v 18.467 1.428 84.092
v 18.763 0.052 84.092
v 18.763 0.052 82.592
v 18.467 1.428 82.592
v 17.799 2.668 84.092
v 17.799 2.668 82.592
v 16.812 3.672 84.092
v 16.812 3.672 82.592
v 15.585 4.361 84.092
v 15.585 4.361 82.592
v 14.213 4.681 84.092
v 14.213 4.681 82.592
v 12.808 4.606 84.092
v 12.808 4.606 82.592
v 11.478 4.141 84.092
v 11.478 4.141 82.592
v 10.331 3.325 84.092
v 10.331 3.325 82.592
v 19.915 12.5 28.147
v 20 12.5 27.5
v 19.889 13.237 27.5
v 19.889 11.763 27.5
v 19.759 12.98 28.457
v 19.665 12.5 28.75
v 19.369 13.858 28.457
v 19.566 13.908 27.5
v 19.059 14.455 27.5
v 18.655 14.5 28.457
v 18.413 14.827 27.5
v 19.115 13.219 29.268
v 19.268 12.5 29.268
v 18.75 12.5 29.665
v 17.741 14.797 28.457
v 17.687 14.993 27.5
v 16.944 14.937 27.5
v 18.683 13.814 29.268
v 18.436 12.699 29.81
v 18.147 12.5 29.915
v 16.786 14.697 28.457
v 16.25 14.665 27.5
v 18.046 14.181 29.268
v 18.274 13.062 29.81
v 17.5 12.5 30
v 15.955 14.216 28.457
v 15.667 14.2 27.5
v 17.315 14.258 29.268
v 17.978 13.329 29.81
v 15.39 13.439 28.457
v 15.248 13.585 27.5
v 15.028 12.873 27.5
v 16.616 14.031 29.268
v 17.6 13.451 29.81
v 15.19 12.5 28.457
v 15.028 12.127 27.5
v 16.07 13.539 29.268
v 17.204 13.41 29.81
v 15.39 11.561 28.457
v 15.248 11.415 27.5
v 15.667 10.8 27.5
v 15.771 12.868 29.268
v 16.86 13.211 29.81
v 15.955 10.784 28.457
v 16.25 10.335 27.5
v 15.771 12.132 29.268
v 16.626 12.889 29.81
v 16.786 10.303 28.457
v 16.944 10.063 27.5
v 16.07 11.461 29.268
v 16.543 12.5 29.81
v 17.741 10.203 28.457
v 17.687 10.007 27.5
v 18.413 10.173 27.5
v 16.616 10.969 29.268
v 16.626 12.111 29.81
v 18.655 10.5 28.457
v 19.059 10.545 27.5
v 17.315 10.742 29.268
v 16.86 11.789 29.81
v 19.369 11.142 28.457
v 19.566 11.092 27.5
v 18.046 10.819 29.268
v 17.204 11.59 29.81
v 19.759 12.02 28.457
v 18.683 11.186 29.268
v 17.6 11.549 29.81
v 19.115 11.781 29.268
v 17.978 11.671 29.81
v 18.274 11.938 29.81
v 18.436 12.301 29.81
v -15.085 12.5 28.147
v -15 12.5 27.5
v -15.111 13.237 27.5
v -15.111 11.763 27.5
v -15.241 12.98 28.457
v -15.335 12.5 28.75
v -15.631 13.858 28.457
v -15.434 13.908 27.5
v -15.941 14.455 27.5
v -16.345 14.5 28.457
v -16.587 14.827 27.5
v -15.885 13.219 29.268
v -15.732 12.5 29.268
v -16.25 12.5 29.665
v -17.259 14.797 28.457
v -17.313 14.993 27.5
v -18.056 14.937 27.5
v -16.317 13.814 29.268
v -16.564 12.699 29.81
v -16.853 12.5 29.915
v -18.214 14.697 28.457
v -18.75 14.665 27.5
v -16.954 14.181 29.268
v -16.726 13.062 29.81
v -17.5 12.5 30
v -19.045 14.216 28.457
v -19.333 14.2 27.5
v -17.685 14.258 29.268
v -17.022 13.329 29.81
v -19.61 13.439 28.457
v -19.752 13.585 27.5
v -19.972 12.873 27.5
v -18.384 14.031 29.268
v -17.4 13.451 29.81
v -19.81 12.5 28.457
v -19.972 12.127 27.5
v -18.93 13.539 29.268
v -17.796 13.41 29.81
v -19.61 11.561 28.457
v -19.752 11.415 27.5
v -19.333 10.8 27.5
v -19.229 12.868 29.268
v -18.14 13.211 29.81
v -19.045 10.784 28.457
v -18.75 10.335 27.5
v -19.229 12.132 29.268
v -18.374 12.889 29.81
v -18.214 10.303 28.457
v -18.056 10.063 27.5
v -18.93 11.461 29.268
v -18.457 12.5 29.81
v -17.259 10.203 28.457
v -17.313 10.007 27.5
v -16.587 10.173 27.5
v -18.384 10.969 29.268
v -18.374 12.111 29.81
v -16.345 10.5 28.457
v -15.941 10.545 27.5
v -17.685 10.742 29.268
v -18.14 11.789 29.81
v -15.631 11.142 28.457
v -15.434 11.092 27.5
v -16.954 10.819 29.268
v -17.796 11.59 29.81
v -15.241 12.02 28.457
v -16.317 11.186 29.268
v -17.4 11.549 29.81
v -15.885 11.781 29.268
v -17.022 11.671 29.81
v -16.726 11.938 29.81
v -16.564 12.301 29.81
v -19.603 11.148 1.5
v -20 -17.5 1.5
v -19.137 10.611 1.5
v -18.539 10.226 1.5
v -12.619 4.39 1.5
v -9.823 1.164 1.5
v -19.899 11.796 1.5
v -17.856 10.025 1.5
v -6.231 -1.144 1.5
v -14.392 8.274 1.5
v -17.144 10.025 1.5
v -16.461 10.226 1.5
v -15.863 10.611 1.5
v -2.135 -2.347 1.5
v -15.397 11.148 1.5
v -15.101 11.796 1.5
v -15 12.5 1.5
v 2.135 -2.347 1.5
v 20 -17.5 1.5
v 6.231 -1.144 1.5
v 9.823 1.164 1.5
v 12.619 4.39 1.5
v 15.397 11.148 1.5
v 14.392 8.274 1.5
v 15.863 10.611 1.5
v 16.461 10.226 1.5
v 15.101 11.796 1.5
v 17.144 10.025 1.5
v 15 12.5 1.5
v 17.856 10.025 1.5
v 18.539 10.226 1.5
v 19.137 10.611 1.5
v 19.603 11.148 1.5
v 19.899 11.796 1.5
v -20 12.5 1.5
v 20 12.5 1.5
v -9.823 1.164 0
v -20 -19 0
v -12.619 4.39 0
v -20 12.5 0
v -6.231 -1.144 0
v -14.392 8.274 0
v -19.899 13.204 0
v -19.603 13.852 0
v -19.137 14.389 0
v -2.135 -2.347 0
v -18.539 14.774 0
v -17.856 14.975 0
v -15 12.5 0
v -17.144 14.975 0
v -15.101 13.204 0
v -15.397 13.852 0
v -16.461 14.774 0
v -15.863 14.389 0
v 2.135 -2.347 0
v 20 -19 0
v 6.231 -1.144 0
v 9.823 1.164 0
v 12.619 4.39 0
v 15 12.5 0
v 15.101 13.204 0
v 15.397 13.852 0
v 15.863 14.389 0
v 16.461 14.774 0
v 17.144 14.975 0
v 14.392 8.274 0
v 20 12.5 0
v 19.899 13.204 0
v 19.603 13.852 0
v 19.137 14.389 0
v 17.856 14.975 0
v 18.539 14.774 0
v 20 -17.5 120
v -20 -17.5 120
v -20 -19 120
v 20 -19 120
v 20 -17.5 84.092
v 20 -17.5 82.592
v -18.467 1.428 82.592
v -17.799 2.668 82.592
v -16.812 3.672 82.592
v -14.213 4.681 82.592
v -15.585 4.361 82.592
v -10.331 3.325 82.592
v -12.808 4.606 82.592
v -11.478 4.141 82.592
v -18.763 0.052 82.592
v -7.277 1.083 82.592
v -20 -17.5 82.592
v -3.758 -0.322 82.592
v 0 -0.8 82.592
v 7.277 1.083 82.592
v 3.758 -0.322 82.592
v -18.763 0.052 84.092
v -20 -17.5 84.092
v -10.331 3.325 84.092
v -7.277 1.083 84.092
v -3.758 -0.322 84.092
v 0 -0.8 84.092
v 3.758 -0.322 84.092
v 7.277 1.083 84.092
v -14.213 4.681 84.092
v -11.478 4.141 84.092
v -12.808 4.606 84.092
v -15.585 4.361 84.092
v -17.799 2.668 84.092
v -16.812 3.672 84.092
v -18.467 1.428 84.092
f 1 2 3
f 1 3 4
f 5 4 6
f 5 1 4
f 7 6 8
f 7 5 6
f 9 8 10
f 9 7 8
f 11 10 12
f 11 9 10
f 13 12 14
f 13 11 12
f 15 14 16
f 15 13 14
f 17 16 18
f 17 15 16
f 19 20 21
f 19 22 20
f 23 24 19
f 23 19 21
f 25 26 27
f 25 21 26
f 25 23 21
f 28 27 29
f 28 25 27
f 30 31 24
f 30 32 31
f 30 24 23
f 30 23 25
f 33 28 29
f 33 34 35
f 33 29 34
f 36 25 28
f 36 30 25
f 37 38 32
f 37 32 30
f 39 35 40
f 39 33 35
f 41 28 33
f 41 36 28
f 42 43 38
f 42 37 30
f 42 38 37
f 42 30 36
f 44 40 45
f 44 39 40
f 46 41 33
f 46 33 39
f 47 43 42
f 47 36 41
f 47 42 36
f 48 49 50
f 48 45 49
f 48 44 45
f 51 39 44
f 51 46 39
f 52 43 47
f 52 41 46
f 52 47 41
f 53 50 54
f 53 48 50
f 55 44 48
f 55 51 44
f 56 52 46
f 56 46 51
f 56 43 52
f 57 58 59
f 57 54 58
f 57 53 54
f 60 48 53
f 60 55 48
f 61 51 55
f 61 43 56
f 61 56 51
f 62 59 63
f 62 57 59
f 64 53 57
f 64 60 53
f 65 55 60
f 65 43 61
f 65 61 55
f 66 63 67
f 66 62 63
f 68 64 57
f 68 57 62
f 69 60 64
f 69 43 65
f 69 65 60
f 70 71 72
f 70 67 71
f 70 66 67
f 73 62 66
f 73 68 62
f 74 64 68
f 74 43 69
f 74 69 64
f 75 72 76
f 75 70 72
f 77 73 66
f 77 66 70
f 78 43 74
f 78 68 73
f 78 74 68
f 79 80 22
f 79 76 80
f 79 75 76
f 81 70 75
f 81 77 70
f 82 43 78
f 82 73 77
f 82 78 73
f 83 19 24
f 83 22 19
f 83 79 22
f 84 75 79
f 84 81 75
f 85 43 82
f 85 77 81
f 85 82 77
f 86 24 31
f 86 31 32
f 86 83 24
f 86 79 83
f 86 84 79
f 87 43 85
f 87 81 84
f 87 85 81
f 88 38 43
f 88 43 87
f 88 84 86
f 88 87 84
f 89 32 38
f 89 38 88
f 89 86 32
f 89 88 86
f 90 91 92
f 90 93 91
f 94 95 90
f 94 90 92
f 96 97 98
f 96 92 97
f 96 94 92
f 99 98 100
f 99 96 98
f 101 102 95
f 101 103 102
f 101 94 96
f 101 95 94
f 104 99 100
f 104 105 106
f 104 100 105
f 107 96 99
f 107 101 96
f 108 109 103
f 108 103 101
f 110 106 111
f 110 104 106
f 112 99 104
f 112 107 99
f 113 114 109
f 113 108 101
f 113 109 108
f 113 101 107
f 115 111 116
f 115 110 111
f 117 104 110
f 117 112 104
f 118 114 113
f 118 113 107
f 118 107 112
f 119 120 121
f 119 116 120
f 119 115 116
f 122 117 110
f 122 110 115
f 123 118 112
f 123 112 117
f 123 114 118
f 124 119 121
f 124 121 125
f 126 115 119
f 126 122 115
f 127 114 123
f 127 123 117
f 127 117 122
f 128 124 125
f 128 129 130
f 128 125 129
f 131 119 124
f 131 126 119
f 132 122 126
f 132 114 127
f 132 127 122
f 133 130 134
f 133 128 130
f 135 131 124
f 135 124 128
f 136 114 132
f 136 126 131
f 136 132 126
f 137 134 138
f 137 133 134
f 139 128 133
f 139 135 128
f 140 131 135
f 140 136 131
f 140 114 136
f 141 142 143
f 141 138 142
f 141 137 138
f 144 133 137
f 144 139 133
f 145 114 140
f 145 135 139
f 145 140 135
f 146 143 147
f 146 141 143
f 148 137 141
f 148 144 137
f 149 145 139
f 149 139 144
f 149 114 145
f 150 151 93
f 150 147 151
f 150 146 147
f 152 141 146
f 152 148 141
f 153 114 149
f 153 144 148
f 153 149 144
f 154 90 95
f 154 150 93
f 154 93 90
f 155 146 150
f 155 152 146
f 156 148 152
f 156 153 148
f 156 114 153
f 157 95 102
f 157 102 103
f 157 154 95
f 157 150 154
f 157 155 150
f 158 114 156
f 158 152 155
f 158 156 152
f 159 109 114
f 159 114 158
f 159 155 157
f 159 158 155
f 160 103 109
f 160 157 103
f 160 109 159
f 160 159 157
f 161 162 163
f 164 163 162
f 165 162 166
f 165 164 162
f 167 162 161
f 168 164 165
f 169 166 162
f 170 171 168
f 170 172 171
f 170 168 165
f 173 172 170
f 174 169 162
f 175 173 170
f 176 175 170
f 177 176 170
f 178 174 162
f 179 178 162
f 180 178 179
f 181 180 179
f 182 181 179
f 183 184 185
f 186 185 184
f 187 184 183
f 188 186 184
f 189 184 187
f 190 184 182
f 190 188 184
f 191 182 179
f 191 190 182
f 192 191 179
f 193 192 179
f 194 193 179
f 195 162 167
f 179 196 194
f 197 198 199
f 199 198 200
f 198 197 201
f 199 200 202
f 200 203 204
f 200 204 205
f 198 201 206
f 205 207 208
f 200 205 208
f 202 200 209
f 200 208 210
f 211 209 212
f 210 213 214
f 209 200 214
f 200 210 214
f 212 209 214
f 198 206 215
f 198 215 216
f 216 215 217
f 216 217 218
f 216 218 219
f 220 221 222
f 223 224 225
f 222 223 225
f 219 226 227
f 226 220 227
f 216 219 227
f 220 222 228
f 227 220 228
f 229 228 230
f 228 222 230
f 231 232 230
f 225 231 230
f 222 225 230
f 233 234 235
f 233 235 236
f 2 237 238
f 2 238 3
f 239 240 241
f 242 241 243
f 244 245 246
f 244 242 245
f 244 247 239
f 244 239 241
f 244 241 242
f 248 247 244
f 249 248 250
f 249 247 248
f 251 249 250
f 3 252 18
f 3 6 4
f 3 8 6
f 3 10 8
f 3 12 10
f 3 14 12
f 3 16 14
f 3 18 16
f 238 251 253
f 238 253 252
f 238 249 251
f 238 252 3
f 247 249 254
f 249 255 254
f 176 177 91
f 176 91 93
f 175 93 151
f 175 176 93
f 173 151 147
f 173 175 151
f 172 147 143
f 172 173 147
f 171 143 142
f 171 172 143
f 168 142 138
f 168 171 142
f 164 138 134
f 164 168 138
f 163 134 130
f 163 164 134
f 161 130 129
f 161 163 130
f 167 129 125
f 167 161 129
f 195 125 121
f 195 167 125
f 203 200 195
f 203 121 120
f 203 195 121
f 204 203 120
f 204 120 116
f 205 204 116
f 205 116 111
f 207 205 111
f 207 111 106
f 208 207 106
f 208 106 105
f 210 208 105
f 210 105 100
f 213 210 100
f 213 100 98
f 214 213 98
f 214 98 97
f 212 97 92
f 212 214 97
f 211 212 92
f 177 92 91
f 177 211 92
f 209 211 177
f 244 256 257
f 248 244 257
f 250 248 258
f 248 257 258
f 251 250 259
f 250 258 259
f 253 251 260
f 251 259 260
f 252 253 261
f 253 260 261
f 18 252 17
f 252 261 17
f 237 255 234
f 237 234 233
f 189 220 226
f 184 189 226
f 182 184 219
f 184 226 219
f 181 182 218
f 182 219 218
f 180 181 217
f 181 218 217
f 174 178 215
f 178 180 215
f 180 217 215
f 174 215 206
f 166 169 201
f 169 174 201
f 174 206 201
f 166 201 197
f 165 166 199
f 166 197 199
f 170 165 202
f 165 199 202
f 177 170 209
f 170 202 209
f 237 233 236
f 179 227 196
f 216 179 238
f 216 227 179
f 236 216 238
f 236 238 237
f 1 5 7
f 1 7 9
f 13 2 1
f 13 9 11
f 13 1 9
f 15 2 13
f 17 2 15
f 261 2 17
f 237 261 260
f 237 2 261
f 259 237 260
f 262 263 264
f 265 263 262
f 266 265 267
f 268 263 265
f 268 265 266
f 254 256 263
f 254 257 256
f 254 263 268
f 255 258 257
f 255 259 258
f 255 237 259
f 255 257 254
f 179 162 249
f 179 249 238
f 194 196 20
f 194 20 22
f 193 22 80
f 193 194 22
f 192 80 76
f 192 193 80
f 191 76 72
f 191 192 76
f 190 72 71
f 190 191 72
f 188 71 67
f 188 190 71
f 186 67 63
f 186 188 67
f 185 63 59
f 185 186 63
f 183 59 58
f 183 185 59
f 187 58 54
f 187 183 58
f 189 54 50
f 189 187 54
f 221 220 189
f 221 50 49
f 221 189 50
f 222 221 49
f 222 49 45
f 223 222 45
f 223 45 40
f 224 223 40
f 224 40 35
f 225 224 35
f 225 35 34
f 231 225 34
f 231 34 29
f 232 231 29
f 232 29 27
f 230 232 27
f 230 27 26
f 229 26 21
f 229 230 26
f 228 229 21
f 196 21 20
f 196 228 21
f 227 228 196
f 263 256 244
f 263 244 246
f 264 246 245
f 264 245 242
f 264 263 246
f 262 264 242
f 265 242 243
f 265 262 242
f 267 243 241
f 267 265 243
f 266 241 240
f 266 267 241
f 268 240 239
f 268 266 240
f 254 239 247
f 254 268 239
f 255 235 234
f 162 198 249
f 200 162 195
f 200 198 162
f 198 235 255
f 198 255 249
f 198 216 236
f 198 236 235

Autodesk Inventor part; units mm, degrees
ref_plane "YZ Plane" through (0, 0, 0) normal (1, 0, 0) x (0, 1, 0)
ref_plane "XZ Plane" through (0, 0, 0) normal (0, 1, 0) x (-1, 0, 0)
ref_plane "XY Plane" through (0, 0, 0) normal (0, 0, 1) x (1, 0, 0)
sketch "Sketch1" plane through (0, 0, 0) normal (0, 0, 1) x (1, 0, 0)
  line L0 (20, 12.5) -> (20, -17.5)
  line L1 (20, -17.5) -> (-20, -17.5)
  line L2 (-20, -17.5) -> (-20, 12.5)
  circle A0 centre (-17.5, 12.5) radius 2.5
  circle A1 centre (17.5, 12.5) radius 2.5
  arc A2 (-15, 12.5) -> (15, 12.5) centre (0, 12.5) ccw
  point P0 (0, 0)
  dimension "d0" = 40
  dimension "d2" = 5
  dimension "d3" = 5
  dimension "d4" = 30
  dimension "d5" = 20
  dimension "d6" = 17.5
  dimension "d7" = 15
extrude "Extrusion1" add sketch "Sketch1" along normal blind 1.5 contours L0 L1 L2 A0 A2 A1
extrude "Extrusion2" add sketch "Sketch1" along normal blind 30 contours A1 | A0
fillet "Fillet1" radius 2.5 2 edges at (-20, 12.5, 30) (15, 12.5, 30)
sketch "Sketch2" plane through (0, 0, 0) normal (0, 0, 1) x (1, 0, 0)
  line L0 (-20, -17.5) -> (20, -17.5) projected
  line L1 (-20, -17.5) -> (20, -17.5) projected
  line L2 (-20, -17.5) -> (20, -17.5)
  line L3 (20, -17.5) -> (20, -19)
  line L4 (20, -19) -> (-20, -19)
  line L5 (-20, -19) -> (-20, -17.5)
  point P0 (0, 0)
  dimension "d13" = 1.5
extrude "Extrusion3" add sketch "Sketch2" along normal blind 120
sketch "Sketch5" plane through (-20, -17.5, 1.5) normal (0, 1, 0) x (1, 0, 0)
  line L0 (0, 0) -> (0, -118.5) projected
  line L1 (40, 0) -> (40, -118.5) projected
  line L2 (0, -81.0917) -> (40, -81.0917)
  line L3 (40, -81.0917) -> (40, -82.5917)
  line L4 (40, -82.5917) -> (0, -82.5917)
  line L5 (0, -82.5917) -> (0, -81.0917)
  line L6 (0, 0) -> (40, 0) projected
  point P0 (20, 1.5)
  point P1 (0, -82.5917)
  dimension "d25" = 1.5
  dimension "d26" = 81.0917
extrude "Extrusion5" add sketch "Sketch5" along normal blind 40 contours L2 L1 L4 L0
sketch "Sketch7" plane through (-20, -17.5, 84.0917) normal (0, 0, 1) x (1, 0, 0)
  arc A0 (9.6688, 20.825) -> (30.3312, 20.825) centre (20, 31.7) ccw
  line L0 (40, 0) -> (0, 0) projected
  line L1 (40, 0) -> (0, 0)
  line L2 (0, 0) -> (1.2374, 17.5516)
  arc A1 (9.6688, 20.825) -> (1.2374, 17.5516) centre (6.225, 17.2) ccw
  line L3 (40, 0) -> (38.7626, 17.5516)
  arc A2 (38.7626, 17.5516) -> (30.3312, 20.825) centre (33.775, 17.2) ccw
  line L4 (20, 0.597) -> (20, 58.4364) construction
  line L5 (40, 0) -> (40, 40) projected
  line L6 (40, 0) -> (40, 40)
  line L7 (0, 0) -> (0, 40) projected
  line L8 (40, 40) -> (0, 40)
  line L9 (0, 40) -> (0, 0)
  point P0 (20, 17.5)
  dimension "d36" = 30
  dimension "d37" = 31.7
  dimension "d38" = 5
  dimension "d39" = 17.2
extrude "Extrusion7" cut sketch "Sketch7" against normal up to surface (1.5 mm away) contours A1 L2 L7 L8 L5 L3 A2 A0
equation "\"d2\" = arm_thickness"
equation "\"d3\" = arm_thickness"
equation "\"d4\" = top_prong_height"
equation "\"d7\" = 3 * arm_thickness"
equation "\"d8\" = material_thickness"
equation "\"d10\" = arm_length"
equation "\"d12\" = 0.5 * arm_thickness"
equation "\"d13\" = material_thickness"
equation "\"d25\" = material_thickness"
equation "\"d36\" = handle_cutout_radius"
equation "\"d37\" = top_prong_height + prong_handle_height"
equation "\"arm_thickness\" = 5"
equation "\"material_thickness\" = 1.5"
equation "\"arm_length\" = 30"
equation "\"top_prong_height\" = 30"
equation "\"handle_cutout_radius\" = 30"
equation "\"prong_handle_height\" = 1.7"
properties part number "my_portafilter_holder_23ipt"
